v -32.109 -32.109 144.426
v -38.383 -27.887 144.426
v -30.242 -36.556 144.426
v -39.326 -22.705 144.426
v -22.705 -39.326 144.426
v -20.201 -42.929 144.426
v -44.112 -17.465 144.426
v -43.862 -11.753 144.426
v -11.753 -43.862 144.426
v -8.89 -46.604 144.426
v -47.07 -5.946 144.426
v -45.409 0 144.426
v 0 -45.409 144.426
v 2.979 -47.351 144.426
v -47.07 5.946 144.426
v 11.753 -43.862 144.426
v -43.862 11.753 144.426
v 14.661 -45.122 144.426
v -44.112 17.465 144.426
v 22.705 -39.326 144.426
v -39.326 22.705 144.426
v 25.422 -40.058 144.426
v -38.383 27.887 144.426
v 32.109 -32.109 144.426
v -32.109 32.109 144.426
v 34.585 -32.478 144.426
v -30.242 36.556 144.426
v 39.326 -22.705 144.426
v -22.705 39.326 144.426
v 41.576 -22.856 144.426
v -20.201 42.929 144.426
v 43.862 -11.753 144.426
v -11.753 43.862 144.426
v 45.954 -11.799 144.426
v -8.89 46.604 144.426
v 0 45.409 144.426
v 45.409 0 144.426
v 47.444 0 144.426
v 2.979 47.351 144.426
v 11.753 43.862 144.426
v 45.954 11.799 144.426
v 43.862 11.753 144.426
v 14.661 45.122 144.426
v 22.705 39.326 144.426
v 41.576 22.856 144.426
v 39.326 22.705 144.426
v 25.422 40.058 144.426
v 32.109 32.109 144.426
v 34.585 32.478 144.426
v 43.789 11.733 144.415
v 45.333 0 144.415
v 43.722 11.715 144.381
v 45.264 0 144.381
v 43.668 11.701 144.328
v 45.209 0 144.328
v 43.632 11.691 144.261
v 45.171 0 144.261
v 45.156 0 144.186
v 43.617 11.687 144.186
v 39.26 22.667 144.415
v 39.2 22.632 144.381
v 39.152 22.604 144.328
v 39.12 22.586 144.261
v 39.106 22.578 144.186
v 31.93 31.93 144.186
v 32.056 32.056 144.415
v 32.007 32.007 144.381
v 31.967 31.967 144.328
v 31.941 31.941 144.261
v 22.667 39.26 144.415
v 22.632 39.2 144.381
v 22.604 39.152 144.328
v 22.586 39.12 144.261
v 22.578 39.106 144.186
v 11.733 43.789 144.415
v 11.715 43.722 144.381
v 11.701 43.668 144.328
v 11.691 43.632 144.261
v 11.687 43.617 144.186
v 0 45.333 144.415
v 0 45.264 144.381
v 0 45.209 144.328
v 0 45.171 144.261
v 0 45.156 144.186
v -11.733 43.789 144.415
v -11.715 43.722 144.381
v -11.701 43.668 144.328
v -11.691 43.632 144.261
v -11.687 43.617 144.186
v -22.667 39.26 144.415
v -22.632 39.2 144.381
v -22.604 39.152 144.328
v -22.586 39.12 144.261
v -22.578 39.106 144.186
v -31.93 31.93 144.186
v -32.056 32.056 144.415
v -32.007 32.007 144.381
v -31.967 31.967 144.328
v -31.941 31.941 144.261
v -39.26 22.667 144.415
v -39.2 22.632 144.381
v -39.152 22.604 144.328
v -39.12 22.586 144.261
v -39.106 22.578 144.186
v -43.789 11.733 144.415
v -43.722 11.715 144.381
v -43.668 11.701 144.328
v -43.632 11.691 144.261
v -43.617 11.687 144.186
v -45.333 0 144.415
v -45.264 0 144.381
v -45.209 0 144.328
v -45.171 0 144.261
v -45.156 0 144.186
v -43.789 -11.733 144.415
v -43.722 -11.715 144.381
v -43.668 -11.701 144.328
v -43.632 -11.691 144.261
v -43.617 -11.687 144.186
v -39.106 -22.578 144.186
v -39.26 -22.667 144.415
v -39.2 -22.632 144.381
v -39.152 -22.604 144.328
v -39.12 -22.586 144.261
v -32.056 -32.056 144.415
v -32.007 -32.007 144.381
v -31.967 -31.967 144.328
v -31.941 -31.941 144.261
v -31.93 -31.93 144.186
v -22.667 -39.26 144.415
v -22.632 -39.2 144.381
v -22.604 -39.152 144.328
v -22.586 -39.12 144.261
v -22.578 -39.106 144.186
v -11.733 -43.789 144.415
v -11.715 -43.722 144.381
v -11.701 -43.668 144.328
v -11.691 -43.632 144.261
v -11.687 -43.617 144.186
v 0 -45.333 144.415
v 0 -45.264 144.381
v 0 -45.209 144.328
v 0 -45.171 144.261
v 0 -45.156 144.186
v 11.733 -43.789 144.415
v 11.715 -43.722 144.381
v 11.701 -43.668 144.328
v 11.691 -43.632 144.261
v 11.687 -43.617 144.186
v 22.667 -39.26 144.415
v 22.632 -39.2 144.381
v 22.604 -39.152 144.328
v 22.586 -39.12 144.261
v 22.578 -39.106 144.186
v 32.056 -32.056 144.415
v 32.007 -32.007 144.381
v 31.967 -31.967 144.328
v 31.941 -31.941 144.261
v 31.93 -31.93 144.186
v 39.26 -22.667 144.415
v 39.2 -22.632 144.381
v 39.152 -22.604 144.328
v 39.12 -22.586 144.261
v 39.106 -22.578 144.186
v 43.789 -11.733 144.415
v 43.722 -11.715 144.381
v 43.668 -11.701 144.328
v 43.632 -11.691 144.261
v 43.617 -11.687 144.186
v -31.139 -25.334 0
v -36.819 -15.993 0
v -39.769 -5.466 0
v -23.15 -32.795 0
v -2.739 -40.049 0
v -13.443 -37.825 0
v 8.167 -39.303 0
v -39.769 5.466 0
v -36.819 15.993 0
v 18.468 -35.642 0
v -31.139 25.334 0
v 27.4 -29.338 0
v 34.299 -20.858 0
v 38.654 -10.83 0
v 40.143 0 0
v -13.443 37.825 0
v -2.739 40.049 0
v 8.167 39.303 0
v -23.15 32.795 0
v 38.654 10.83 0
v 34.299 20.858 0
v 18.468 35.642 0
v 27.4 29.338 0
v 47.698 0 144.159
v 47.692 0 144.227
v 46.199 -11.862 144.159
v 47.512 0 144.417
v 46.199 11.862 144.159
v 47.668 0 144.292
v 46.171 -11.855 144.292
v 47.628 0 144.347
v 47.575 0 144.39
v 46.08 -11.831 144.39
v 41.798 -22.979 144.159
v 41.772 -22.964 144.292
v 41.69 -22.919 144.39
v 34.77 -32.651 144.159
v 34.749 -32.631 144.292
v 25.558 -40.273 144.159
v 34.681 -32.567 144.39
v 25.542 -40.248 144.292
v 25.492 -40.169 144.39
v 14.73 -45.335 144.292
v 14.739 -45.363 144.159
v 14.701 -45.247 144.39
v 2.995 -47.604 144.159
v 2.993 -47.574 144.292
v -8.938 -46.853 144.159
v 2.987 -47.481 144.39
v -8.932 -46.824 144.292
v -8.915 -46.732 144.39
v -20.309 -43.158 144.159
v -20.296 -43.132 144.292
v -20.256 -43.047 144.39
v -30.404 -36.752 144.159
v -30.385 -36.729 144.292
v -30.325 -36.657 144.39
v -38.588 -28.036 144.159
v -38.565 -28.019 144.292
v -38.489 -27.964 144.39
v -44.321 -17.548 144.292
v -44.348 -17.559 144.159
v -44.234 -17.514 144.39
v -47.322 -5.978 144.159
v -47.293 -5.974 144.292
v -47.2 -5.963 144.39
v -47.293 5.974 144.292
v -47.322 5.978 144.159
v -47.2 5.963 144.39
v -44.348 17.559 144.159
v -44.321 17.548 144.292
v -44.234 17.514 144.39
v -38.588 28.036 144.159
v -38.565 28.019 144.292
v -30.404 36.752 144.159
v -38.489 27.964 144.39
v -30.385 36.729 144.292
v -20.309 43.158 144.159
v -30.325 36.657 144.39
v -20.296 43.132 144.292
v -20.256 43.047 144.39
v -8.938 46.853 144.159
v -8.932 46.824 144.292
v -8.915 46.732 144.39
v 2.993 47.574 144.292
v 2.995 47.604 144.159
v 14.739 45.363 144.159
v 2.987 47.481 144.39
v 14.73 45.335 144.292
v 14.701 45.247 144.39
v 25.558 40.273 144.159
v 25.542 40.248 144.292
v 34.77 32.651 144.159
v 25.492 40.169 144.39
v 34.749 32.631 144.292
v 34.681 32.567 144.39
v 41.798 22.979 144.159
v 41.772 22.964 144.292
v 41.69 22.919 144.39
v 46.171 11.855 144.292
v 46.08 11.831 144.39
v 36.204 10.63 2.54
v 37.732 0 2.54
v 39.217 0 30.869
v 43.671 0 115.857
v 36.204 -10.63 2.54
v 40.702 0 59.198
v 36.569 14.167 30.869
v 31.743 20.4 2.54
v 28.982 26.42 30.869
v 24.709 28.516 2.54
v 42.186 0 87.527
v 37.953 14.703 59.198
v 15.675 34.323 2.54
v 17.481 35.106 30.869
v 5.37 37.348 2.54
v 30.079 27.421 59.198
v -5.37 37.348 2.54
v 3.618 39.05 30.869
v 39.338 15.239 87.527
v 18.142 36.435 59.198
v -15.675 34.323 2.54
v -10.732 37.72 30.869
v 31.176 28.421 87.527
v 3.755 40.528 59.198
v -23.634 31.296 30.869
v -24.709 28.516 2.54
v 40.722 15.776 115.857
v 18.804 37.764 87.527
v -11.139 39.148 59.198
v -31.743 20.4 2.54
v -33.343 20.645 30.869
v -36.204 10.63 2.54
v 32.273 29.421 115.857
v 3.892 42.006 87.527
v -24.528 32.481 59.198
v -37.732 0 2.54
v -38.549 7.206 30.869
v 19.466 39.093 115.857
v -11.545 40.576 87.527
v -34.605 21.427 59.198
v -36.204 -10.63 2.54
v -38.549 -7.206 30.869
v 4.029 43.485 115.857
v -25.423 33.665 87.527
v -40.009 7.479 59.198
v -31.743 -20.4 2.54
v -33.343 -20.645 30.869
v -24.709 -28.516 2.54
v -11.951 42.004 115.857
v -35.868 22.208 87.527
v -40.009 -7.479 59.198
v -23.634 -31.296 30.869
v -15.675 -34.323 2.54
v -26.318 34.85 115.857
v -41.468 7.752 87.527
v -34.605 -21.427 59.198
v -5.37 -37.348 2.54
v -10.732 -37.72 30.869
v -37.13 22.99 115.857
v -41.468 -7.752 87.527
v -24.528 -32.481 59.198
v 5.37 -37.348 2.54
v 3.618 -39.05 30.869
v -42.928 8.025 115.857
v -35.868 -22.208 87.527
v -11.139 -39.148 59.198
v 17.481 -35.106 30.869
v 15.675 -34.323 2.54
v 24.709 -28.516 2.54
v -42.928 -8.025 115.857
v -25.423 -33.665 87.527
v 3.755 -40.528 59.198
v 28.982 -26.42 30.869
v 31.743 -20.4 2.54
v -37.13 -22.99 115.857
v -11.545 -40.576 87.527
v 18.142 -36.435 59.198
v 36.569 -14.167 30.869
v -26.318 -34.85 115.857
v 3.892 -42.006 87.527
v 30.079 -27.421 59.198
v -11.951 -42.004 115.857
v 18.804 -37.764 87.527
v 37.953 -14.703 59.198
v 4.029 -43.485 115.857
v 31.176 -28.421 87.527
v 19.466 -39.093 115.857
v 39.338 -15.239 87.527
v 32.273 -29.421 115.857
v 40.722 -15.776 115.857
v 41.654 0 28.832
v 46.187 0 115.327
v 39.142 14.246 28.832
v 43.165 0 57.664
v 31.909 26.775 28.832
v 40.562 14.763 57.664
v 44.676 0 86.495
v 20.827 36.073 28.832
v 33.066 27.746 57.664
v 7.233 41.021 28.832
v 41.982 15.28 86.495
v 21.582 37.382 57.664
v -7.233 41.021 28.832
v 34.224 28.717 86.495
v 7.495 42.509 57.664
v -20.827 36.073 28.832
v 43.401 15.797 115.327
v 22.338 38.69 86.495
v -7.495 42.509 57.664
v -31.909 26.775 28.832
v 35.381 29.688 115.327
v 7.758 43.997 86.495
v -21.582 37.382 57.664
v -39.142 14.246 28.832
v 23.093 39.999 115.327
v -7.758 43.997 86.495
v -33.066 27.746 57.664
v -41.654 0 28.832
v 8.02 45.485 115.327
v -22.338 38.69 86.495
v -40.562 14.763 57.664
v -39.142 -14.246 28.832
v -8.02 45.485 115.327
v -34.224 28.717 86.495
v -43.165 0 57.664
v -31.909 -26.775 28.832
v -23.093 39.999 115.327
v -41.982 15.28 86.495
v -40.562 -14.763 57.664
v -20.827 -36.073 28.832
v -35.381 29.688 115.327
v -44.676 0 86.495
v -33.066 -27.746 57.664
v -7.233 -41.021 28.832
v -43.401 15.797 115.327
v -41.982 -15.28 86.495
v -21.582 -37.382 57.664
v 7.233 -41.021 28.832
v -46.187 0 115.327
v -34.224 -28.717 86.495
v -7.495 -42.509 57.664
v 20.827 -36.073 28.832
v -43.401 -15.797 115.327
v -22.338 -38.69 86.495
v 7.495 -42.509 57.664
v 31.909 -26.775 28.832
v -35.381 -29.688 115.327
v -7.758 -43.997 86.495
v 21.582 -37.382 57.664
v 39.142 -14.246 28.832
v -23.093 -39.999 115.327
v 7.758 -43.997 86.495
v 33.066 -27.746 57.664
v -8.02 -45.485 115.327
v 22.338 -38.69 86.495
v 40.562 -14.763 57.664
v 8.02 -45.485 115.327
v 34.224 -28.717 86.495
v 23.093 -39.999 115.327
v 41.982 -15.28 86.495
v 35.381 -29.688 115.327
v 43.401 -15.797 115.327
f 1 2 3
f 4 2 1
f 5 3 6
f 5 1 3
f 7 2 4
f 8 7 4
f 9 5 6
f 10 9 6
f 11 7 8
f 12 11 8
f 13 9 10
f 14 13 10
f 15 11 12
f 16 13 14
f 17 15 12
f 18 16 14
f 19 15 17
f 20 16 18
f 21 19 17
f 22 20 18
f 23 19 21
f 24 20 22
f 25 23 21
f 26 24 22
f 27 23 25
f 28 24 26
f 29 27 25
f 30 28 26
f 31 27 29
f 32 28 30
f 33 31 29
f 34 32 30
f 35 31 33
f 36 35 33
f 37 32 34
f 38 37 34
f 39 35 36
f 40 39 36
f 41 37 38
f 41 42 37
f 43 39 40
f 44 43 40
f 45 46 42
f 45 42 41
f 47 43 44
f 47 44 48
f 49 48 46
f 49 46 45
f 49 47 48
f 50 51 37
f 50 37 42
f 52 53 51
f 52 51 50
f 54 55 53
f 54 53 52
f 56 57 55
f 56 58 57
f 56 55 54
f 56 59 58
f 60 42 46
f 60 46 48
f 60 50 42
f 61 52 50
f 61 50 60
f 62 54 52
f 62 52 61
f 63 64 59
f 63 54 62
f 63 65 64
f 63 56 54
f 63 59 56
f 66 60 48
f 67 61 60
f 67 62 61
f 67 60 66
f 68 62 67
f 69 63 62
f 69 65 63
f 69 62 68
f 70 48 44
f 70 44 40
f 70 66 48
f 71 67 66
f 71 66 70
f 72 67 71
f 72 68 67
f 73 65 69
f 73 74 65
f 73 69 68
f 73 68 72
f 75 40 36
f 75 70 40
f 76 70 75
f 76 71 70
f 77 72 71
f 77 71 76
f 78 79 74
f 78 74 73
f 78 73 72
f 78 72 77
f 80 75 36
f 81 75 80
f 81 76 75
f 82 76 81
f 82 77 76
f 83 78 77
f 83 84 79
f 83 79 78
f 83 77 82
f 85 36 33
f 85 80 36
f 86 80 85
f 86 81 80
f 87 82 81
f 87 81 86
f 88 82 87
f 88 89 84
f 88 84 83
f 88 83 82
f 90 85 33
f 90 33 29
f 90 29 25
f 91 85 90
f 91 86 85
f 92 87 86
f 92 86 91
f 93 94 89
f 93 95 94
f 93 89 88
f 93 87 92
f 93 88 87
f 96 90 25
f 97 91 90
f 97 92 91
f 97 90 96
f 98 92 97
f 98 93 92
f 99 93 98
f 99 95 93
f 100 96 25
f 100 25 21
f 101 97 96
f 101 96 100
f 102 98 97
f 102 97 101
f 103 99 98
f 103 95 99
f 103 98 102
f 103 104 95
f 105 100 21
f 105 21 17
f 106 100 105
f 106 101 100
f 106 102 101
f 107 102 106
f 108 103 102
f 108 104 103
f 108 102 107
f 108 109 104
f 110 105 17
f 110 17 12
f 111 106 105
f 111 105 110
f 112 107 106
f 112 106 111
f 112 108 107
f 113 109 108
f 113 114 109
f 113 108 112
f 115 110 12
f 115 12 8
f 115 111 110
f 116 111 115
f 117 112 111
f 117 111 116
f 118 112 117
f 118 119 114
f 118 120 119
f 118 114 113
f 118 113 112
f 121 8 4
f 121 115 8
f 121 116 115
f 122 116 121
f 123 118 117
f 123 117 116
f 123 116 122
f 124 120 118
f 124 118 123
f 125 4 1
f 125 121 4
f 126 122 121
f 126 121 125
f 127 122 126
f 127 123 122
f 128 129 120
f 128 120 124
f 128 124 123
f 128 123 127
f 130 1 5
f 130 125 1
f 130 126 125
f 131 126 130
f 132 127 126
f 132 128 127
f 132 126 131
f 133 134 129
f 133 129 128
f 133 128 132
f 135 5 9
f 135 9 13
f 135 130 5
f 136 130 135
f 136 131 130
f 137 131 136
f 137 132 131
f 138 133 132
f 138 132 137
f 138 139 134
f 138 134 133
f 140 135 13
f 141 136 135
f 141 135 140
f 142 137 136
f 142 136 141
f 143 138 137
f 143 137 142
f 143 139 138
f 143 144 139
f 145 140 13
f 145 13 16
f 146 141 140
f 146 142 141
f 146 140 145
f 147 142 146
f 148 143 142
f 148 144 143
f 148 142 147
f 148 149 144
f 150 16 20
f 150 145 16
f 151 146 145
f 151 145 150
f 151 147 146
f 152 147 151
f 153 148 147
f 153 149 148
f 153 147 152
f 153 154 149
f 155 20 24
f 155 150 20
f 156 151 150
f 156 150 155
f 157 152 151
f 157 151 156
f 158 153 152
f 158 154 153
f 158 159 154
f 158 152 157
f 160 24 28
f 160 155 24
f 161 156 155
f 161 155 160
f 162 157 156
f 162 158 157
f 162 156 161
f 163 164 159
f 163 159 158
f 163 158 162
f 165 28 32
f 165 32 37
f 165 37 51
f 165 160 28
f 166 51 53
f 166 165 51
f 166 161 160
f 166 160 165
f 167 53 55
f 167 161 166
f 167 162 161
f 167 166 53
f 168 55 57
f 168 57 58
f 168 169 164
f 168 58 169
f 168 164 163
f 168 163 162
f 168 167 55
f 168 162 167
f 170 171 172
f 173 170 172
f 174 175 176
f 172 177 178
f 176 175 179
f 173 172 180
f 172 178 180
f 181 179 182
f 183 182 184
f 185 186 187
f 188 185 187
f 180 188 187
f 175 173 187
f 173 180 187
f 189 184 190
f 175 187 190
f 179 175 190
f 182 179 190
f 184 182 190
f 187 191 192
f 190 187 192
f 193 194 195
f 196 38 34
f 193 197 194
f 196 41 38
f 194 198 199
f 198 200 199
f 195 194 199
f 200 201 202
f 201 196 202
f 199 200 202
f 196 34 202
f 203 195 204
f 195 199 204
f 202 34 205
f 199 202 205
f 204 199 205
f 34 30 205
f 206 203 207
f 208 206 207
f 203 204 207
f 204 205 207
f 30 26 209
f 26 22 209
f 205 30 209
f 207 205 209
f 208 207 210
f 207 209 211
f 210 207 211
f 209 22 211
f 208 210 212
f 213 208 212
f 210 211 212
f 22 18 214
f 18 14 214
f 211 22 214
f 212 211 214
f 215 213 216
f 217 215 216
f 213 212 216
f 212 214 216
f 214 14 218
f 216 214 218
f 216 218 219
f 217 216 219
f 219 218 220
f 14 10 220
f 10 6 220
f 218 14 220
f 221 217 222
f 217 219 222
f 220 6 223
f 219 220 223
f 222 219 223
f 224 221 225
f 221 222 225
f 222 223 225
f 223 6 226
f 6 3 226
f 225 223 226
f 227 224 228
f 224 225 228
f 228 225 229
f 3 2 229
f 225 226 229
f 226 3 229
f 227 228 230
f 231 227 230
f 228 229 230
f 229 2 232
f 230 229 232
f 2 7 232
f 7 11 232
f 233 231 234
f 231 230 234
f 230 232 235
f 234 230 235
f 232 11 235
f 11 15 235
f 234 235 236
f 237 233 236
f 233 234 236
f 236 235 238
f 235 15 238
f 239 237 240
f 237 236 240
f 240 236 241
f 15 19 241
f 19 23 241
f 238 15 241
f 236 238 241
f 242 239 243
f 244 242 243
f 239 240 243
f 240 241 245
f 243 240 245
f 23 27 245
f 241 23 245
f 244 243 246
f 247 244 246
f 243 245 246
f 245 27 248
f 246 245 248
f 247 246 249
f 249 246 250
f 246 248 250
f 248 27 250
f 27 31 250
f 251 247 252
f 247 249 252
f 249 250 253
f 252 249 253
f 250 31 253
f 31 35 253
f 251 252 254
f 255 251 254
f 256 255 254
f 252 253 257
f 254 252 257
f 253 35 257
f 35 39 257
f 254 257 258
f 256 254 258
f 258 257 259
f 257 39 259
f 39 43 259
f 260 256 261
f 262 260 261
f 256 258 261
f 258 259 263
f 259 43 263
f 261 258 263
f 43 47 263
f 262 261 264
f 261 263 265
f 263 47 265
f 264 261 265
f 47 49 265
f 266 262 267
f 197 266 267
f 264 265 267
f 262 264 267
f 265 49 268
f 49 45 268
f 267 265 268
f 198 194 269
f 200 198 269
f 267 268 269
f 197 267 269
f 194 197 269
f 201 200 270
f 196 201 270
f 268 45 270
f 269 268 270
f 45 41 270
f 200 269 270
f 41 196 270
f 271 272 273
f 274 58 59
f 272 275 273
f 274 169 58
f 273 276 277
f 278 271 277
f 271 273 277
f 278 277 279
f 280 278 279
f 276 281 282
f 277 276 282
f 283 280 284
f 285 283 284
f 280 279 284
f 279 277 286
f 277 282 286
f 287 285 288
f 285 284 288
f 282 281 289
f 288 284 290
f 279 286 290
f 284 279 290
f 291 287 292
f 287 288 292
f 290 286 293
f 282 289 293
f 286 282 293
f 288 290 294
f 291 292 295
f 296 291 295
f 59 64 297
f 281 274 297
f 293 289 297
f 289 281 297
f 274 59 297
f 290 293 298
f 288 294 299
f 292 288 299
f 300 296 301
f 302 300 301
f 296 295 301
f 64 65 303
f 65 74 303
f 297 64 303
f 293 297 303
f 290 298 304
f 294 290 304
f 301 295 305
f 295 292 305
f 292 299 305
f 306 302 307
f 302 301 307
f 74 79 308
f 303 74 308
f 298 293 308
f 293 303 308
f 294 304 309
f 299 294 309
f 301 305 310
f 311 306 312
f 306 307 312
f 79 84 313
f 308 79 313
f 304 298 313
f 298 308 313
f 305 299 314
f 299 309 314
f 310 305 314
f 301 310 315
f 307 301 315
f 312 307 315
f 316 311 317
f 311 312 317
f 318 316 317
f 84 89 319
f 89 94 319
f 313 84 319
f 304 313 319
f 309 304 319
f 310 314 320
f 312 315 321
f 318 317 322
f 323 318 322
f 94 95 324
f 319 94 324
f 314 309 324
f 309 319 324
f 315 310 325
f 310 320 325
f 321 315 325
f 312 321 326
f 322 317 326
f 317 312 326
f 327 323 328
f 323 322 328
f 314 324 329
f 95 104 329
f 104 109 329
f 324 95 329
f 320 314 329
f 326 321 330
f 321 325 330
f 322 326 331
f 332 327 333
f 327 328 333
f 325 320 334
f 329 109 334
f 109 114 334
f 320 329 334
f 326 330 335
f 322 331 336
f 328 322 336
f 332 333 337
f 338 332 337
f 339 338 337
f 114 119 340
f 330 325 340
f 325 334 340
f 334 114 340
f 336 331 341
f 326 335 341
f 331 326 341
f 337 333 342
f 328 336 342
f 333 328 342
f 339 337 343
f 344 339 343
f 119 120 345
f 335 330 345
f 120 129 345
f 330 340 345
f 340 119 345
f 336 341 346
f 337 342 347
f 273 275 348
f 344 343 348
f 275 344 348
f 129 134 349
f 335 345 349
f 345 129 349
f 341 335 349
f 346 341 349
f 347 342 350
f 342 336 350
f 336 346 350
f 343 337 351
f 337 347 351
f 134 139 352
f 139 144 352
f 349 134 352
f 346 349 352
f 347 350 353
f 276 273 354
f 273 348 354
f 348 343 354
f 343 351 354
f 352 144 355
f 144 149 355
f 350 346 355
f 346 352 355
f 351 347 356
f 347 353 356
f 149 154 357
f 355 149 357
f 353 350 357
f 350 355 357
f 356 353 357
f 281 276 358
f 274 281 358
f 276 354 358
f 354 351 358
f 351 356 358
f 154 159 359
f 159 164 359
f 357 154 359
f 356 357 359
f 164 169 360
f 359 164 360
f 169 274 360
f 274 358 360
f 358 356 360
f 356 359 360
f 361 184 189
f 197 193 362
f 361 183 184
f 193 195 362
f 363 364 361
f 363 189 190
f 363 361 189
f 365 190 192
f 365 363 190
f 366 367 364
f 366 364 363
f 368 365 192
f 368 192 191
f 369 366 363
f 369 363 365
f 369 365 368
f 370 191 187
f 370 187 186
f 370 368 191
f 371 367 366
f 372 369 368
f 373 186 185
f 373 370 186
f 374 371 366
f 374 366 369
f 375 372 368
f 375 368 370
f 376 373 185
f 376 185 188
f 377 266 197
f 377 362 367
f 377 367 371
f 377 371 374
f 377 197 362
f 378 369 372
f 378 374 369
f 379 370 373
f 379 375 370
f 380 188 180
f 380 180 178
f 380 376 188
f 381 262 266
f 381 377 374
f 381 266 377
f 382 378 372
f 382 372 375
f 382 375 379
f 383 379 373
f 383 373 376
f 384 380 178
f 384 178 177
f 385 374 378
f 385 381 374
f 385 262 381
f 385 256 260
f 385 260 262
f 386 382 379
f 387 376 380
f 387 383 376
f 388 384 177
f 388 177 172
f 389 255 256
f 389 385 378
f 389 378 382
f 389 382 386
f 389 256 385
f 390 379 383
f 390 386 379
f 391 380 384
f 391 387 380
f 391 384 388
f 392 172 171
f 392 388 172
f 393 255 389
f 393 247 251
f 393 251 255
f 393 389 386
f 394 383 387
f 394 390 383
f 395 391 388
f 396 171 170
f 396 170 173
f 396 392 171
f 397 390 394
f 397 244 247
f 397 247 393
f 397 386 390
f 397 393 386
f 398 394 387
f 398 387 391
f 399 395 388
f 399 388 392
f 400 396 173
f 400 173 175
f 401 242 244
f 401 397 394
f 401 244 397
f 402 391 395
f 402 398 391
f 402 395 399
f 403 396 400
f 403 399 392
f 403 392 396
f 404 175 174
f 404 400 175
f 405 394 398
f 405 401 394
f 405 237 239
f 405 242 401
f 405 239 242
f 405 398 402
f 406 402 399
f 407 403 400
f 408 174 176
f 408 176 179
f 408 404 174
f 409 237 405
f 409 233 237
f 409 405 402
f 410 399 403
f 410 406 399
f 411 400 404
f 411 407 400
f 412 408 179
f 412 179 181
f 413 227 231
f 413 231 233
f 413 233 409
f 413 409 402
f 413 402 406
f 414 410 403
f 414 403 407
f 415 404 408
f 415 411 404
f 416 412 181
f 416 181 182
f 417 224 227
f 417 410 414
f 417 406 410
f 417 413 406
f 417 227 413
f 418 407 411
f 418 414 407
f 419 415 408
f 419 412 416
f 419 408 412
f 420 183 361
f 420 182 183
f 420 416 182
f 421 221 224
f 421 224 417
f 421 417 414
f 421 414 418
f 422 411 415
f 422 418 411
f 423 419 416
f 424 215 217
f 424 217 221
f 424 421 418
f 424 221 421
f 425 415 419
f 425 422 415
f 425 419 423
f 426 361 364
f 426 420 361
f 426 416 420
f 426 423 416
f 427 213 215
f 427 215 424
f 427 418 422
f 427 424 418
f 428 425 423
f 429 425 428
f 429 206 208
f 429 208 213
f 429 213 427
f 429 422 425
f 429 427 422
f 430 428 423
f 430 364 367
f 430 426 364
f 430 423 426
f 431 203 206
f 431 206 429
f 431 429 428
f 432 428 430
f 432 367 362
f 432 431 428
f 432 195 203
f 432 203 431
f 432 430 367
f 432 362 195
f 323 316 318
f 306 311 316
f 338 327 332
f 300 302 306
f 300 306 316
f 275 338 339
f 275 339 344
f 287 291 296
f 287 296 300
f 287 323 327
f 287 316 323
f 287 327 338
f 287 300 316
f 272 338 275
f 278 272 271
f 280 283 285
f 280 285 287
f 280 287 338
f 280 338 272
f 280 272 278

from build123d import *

# Parameters (mm, degrees)
F0_R     = 40.1427902356
F1_DEPTH = 144.426420331
F1_TAPER = -3
F2_T     = -2.54
F3_R     = 0.254


with BuildPart() as f1:
    # F0 (on Top) → F1 (new body)
    with BuildSketch(Plane.XY):
        Circle(F0_R)
    extrude(amount=F1_DEPTH, taper=F1_TAPER)

    # F2
    f2_openings = [f1.faces().sort_by_distance(p)[0] for p in [
        (0, 0, 144.42642),
    ]]
    offset(amount=F2_T, openings=f2_openings, kind=Kind.INTERSECTION)

    # F3
    f3_edges = [f1.edges().sort_by_distance(p)[0] for p in [
        (-47.711858, 0, 144.42642),
        (-45.168372, 0, 144.42642),
    ]]
    fillet(f3_edges, radius=F3_R)


solid = f1.part
